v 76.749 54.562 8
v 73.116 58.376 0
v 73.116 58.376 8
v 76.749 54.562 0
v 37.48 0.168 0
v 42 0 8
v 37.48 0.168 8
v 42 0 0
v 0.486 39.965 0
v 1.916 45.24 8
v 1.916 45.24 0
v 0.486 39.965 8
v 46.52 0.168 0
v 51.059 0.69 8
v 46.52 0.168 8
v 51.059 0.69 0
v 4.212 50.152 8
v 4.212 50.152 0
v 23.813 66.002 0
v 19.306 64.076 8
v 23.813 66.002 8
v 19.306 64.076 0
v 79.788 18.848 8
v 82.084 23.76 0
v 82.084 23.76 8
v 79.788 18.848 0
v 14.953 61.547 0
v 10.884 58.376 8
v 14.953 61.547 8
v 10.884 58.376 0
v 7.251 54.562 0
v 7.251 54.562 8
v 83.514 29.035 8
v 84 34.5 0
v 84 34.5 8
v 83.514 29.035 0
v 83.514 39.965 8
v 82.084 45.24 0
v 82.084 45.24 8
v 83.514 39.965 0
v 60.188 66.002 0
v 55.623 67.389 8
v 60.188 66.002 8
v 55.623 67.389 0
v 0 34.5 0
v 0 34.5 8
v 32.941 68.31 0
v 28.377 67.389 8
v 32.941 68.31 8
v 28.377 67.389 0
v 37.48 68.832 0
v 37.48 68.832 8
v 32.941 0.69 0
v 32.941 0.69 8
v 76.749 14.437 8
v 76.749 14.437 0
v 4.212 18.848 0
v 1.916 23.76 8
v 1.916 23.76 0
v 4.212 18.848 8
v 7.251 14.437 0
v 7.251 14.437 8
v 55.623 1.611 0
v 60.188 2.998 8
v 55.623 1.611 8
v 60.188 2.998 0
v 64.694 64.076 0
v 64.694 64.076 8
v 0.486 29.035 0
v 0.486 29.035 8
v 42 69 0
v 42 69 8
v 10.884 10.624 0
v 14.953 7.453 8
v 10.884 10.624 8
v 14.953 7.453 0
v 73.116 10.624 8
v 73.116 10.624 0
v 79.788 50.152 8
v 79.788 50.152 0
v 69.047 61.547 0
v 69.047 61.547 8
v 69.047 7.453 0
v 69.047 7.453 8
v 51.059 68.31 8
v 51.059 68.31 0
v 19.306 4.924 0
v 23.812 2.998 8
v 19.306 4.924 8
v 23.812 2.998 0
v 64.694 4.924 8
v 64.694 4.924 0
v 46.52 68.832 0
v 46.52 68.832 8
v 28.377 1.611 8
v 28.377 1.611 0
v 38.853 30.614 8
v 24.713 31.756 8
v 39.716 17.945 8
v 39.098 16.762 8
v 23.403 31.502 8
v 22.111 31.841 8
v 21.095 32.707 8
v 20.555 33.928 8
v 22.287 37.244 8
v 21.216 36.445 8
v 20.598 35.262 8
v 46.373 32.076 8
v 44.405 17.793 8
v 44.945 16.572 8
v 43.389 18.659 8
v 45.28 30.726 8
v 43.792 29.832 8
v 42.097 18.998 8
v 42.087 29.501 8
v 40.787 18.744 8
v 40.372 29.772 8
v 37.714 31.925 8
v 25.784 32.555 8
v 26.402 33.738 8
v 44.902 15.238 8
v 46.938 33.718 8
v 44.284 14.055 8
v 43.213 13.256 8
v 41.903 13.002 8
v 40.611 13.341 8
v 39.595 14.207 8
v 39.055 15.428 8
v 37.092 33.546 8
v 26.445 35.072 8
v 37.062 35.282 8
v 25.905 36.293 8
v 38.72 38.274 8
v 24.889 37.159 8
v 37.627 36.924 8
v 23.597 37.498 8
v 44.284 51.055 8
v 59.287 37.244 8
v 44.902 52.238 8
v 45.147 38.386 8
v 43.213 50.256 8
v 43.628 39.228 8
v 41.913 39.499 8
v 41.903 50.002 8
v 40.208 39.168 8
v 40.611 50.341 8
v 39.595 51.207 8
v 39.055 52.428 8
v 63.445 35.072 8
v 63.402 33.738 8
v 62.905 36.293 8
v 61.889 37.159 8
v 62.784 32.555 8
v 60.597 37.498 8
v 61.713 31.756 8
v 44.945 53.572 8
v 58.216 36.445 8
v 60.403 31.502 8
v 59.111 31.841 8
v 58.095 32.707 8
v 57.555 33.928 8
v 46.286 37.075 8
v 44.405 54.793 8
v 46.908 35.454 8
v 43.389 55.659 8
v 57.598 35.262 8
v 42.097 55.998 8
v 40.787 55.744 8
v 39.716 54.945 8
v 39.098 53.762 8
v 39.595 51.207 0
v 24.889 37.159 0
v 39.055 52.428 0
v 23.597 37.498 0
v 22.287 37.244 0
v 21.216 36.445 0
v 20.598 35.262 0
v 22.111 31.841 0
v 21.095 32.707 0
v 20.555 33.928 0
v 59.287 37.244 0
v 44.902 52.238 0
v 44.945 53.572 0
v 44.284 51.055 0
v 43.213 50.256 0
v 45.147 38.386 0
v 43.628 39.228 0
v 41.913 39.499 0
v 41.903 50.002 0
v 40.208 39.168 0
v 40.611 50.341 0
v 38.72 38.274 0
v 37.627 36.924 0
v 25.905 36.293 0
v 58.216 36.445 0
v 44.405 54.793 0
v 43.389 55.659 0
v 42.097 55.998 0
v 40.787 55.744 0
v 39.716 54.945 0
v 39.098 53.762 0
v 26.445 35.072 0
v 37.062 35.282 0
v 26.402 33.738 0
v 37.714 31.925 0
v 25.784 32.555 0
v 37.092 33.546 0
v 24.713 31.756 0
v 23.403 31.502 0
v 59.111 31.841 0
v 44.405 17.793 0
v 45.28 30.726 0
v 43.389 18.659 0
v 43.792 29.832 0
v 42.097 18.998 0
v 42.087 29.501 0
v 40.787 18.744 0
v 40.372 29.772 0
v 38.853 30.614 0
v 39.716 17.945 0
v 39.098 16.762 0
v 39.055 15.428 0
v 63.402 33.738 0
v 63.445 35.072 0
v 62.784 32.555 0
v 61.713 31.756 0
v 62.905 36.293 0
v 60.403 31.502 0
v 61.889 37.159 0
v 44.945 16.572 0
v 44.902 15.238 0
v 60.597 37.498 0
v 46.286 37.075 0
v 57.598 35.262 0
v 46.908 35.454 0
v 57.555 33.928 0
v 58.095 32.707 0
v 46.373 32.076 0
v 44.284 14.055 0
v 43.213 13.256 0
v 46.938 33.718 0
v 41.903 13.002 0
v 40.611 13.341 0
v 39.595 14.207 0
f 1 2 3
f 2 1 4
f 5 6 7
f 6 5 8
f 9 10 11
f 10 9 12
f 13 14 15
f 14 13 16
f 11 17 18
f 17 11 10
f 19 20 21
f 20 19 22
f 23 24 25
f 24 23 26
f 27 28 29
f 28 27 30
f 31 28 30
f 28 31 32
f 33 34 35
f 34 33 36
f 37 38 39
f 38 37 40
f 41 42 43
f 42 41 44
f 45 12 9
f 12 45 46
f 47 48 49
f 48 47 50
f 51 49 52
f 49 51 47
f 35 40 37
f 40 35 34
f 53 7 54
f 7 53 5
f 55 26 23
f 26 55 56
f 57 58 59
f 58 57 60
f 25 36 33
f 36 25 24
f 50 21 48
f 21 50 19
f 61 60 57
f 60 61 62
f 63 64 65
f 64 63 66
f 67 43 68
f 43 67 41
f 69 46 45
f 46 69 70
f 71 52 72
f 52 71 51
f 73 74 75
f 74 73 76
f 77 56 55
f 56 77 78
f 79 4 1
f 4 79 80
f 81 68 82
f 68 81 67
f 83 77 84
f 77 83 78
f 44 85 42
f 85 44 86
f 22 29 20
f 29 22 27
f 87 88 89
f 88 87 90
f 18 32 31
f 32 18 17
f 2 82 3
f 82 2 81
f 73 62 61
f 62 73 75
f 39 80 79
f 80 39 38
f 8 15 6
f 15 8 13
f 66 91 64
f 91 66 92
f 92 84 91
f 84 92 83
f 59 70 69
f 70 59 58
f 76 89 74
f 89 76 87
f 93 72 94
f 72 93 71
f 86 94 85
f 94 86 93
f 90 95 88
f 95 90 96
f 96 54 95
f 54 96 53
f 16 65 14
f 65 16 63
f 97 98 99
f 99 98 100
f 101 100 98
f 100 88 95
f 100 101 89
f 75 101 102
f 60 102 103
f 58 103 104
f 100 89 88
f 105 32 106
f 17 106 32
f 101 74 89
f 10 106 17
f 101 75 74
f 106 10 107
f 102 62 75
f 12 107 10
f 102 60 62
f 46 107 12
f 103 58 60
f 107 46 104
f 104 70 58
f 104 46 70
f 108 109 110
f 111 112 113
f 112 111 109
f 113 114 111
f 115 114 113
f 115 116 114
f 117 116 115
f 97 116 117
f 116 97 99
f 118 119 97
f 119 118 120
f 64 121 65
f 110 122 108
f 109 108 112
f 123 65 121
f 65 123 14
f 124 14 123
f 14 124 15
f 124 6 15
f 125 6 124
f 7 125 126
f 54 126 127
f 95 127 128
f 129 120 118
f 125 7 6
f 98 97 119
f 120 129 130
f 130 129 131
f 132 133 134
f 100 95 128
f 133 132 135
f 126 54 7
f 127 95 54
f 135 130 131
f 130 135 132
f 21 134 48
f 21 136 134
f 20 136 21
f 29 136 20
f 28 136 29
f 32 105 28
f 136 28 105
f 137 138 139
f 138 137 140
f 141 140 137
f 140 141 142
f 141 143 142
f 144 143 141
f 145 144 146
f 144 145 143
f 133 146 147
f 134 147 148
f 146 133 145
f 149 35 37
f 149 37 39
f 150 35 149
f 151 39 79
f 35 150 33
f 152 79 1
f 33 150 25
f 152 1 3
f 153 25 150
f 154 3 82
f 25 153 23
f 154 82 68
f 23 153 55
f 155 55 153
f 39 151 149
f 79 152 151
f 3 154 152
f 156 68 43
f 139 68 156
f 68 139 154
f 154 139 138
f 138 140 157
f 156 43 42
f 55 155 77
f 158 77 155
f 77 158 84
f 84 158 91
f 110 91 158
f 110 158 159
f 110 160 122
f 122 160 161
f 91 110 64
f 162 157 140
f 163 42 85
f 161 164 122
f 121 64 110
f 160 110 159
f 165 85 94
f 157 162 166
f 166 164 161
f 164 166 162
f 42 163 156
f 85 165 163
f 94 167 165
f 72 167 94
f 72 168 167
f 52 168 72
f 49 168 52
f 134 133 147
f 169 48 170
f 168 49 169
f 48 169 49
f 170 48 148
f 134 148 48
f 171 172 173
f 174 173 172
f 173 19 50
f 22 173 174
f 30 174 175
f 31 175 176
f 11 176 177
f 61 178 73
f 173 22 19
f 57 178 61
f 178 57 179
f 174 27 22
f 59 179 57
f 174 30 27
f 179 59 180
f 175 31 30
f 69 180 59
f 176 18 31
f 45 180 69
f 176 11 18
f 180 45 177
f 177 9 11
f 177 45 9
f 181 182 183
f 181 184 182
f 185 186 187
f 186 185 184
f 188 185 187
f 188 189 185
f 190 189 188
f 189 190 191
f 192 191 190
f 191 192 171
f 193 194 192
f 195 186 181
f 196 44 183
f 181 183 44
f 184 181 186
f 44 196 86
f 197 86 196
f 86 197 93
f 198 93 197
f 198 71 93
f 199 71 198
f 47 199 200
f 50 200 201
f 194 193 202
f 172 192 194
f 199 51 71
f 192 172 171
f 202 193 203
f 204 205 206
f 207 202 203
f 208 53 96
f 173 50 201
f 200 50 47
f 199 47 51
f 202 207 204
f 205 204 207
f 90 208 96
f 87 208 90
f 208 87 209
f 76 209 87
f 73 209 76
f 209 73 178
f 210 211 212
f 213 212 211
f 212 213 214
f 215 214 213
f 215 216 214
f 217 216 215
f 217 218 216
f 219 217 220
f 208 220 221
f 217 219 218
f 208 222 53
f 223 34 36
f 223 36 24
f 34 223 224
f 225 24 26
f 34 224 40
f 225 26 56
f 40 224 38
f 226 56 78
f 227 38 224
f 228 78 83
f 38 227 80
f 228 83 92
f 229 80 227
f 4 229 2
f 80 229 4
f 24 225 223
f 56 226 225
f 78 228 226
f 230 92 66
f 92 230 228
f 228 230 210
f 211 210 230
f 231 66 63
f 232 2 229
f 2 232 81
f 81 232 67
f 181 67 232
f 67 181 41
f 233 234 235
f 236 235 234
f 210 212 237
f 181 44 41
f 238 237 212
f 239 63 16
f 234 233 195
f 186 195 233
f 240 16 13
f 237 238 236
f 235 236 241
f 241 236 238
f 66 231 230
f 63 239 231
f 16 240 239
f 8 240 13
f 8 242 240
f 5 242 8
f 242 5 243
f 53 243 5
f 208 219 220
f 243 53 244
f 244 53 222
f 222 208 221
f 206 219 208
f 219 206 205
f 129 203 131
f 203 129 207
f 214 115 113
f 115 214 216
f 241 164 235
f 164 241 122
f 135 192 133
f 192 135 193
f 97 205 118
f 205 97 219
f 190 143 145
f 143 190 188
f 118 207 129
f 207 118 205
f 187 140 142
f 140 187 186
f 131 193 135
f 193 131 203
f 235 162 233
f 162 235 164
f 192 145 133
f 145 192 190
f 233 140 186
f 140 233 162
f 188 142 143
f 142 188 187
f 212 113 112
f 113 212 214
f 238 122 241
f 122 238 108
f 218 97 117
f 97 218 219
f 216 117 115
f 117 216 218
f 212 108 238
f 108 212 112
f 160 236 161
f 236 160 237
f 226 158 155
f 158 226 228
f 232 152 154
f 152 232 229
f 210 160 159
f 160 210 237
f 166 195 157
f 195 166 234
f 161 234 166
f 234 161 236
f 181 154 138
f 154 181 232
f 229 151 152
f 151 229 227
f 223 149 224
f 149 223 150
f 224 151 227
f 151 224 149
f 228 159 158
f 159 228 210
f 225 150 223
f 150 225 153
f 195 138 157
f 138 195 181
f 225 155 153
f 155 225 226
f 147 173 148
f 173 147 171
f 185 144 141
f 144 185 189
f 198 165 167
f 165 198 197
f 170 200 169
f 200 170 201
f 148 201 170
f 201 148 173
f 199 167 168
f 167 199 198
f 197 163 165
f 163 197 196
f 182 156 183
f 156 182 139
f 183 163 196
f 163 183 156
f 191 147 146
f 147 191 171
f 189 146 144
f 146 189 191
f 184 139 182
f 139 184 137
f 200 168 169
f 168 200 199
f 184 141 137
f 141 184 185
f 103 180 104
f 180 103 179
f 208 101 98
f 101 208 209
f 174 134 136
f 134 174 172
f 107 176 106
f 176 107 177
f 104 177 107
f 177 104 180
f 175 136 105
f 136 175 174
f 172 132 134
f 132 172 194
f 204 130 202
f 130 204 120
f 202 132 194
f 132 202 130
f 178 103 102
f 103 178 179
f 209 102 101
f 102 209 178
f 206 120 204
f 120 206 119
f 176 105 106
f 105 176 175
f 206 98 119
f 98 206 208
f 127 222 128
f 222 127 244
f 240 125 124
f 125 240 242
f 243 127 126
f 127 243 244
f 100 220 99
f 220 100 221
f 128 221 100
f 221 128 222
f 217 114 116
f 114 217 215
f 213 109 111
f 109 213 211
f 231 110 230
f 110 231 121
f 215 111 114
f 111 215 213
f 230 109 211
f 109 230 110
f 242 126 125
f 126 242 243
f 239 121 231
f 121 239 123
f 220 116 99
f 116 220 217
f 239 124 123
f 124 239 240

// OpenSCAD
$fn = 32;

// ----------------------------------------------------------------------
// Cam plate: double_lobe cam, base R32
// ----------------------------------------------------------------------

// --- parameters (mm) ---
base_r = 32;              // base circle radius
lobe_h = 10;              // cam lobe rise
bore_r = 5;               // shaft bore radius
plate_t = 8;              // plate thickness, Z (extrusion height)
ring_r = 18.5;            // lightening ring radius
bolt_r = 3;               // lightening hole radius

profile = [[84, 34.5], [83.514, 39.965], [82.084, 45.24], [79.788, 50.152], [76.749, 54.562], [73.116, 58.376], [69.047, 61.547], [64.694, 64.076], [60.188, 66.002], [55.623, 67.389], [51.059, 68.31], [46.52, 68.832], [42, 69], [37.48, 68.832], [32.941, 68.31], [28.377, 67.389], [23.813, 66.002], [19.306, 64.076], [14.953, 61.547], [10.884, 58.376], [7.251, 54.562], [4.212, 50.152], [1.916, 45.24], [0.486, 39.965], [0, 34.5], [0.486, 29.035], [1.916, 23.76], [4.212, 18.848], [7.251, 14.437], [10.884, 10.624], [14.953, 7.453], [19.306, 4.924], [23.812, 2.998], [28.377, 1.611], [32.941, 0.69], [37.48, 0.168], [42, 0], [46.52, 0.168], [51.059, 0.69], [55.623, 1.611], [60.188, 2.998], [64.694, 4.924], [69.047, 7.453], [73.116, 10.624], [76.749, 14.437], [79.788, 18.848], [82.084, 23.76], [83.514, 29.035]];  // primary outline, 48 points, counter clockwise
void_1 = [[46.908, 35.454], [46.286, 37.075], [45.147, 38.386], [43.628, 39.228], [41.913, 39.499], [40.208, 39.168], [38.72, 38.274], [37.627, 36.924], [37.062, 35.282], [37.092, 33.546], [37.714, 31.925], [38.853, 30.614], [40.372, 29.772], [42.087, 29.501], [43.792, 29.832], [45.28, 30.726], [46.373, 32.076], [46.938, 33.718]];  // shaft bore, 18 points
void_2 = [[63.445, 35.072], [62.905, 36.293], [61.889, 37.159], [60.597, 37.498], [59.287, 37.244], [58.216, 36.445], [57.598, 35.262], [57.555, 33.928], [58.095, 32.707], [59.111, 31.841], [60.403, 31.502], [61.713, 31.756], [62.784, 32.555], [63.402, 33.738]];  // lightening hole 1, 14 points
void_3 = [[44.945, 53.572], [44.405, 54.793], [43.389, 55.659], [42.097, 55.998], [40.787, 55.744], [39.716, 54.945], [39.098, 53.762], [39.055, 52.428], [39.595, 51.207], [40.611, 50.341], [41.903, 50.002], [43.213, 50.256], [44.284, 51.055], [44.902, 52.238]];  // lightening hole 2, 14 points
void_4 = [[26.445, 35.072], [25.905, 36.293], [24.889, 37.159], [23.597, 37.498], [22.287, 37.244], [21.216, 36.445], [20.598, 35.262], [20.555, 33.928], [21.095, 32.707], [22.111, 31.841], [23.403, 31.502], [24.713, 31.756], [25.784, 32.555], [26.402, 33.738]];  // lightening hole 3, 14 points
void_5 = [[44.945, 16.572], [44.405, 17.793], [43.389, 18.659], [42.097, 18.998], [40.787, 18.744], [39.716, 17.945], [39.098, 16.762], [39.055, 15.428], [39.595, 14.207], [40.611, 13.341], [41.903, 13.002], [43.213, 13.256], [44.284, 14.055], [44.902, 15.238]];  // lightening hole 4, 14 points

// --- the one profile operation ---
difference() {
  linear_extrude(height = plate_t) polygon(points = profile);
  translate([0, 0, -1])
    linear_extrude(height = plate_t + 2) polygon(points = void_1);
  translate([0, 0, -1])
    linear_extrude(height = plate_t + 2) polygon(points = void_2);
  translate([0, 0, -1])
    linear_extrude(height = plate_t + 2) polygon(points = void_3);
  translate([0, 0, -1])
    linear_extrude(height = plate_t + 2) polygon(points = void_4);
  translate([0, 0, -1])
    linear_extrude(height = plate_t + 2) polygon(points = void_5);
}
